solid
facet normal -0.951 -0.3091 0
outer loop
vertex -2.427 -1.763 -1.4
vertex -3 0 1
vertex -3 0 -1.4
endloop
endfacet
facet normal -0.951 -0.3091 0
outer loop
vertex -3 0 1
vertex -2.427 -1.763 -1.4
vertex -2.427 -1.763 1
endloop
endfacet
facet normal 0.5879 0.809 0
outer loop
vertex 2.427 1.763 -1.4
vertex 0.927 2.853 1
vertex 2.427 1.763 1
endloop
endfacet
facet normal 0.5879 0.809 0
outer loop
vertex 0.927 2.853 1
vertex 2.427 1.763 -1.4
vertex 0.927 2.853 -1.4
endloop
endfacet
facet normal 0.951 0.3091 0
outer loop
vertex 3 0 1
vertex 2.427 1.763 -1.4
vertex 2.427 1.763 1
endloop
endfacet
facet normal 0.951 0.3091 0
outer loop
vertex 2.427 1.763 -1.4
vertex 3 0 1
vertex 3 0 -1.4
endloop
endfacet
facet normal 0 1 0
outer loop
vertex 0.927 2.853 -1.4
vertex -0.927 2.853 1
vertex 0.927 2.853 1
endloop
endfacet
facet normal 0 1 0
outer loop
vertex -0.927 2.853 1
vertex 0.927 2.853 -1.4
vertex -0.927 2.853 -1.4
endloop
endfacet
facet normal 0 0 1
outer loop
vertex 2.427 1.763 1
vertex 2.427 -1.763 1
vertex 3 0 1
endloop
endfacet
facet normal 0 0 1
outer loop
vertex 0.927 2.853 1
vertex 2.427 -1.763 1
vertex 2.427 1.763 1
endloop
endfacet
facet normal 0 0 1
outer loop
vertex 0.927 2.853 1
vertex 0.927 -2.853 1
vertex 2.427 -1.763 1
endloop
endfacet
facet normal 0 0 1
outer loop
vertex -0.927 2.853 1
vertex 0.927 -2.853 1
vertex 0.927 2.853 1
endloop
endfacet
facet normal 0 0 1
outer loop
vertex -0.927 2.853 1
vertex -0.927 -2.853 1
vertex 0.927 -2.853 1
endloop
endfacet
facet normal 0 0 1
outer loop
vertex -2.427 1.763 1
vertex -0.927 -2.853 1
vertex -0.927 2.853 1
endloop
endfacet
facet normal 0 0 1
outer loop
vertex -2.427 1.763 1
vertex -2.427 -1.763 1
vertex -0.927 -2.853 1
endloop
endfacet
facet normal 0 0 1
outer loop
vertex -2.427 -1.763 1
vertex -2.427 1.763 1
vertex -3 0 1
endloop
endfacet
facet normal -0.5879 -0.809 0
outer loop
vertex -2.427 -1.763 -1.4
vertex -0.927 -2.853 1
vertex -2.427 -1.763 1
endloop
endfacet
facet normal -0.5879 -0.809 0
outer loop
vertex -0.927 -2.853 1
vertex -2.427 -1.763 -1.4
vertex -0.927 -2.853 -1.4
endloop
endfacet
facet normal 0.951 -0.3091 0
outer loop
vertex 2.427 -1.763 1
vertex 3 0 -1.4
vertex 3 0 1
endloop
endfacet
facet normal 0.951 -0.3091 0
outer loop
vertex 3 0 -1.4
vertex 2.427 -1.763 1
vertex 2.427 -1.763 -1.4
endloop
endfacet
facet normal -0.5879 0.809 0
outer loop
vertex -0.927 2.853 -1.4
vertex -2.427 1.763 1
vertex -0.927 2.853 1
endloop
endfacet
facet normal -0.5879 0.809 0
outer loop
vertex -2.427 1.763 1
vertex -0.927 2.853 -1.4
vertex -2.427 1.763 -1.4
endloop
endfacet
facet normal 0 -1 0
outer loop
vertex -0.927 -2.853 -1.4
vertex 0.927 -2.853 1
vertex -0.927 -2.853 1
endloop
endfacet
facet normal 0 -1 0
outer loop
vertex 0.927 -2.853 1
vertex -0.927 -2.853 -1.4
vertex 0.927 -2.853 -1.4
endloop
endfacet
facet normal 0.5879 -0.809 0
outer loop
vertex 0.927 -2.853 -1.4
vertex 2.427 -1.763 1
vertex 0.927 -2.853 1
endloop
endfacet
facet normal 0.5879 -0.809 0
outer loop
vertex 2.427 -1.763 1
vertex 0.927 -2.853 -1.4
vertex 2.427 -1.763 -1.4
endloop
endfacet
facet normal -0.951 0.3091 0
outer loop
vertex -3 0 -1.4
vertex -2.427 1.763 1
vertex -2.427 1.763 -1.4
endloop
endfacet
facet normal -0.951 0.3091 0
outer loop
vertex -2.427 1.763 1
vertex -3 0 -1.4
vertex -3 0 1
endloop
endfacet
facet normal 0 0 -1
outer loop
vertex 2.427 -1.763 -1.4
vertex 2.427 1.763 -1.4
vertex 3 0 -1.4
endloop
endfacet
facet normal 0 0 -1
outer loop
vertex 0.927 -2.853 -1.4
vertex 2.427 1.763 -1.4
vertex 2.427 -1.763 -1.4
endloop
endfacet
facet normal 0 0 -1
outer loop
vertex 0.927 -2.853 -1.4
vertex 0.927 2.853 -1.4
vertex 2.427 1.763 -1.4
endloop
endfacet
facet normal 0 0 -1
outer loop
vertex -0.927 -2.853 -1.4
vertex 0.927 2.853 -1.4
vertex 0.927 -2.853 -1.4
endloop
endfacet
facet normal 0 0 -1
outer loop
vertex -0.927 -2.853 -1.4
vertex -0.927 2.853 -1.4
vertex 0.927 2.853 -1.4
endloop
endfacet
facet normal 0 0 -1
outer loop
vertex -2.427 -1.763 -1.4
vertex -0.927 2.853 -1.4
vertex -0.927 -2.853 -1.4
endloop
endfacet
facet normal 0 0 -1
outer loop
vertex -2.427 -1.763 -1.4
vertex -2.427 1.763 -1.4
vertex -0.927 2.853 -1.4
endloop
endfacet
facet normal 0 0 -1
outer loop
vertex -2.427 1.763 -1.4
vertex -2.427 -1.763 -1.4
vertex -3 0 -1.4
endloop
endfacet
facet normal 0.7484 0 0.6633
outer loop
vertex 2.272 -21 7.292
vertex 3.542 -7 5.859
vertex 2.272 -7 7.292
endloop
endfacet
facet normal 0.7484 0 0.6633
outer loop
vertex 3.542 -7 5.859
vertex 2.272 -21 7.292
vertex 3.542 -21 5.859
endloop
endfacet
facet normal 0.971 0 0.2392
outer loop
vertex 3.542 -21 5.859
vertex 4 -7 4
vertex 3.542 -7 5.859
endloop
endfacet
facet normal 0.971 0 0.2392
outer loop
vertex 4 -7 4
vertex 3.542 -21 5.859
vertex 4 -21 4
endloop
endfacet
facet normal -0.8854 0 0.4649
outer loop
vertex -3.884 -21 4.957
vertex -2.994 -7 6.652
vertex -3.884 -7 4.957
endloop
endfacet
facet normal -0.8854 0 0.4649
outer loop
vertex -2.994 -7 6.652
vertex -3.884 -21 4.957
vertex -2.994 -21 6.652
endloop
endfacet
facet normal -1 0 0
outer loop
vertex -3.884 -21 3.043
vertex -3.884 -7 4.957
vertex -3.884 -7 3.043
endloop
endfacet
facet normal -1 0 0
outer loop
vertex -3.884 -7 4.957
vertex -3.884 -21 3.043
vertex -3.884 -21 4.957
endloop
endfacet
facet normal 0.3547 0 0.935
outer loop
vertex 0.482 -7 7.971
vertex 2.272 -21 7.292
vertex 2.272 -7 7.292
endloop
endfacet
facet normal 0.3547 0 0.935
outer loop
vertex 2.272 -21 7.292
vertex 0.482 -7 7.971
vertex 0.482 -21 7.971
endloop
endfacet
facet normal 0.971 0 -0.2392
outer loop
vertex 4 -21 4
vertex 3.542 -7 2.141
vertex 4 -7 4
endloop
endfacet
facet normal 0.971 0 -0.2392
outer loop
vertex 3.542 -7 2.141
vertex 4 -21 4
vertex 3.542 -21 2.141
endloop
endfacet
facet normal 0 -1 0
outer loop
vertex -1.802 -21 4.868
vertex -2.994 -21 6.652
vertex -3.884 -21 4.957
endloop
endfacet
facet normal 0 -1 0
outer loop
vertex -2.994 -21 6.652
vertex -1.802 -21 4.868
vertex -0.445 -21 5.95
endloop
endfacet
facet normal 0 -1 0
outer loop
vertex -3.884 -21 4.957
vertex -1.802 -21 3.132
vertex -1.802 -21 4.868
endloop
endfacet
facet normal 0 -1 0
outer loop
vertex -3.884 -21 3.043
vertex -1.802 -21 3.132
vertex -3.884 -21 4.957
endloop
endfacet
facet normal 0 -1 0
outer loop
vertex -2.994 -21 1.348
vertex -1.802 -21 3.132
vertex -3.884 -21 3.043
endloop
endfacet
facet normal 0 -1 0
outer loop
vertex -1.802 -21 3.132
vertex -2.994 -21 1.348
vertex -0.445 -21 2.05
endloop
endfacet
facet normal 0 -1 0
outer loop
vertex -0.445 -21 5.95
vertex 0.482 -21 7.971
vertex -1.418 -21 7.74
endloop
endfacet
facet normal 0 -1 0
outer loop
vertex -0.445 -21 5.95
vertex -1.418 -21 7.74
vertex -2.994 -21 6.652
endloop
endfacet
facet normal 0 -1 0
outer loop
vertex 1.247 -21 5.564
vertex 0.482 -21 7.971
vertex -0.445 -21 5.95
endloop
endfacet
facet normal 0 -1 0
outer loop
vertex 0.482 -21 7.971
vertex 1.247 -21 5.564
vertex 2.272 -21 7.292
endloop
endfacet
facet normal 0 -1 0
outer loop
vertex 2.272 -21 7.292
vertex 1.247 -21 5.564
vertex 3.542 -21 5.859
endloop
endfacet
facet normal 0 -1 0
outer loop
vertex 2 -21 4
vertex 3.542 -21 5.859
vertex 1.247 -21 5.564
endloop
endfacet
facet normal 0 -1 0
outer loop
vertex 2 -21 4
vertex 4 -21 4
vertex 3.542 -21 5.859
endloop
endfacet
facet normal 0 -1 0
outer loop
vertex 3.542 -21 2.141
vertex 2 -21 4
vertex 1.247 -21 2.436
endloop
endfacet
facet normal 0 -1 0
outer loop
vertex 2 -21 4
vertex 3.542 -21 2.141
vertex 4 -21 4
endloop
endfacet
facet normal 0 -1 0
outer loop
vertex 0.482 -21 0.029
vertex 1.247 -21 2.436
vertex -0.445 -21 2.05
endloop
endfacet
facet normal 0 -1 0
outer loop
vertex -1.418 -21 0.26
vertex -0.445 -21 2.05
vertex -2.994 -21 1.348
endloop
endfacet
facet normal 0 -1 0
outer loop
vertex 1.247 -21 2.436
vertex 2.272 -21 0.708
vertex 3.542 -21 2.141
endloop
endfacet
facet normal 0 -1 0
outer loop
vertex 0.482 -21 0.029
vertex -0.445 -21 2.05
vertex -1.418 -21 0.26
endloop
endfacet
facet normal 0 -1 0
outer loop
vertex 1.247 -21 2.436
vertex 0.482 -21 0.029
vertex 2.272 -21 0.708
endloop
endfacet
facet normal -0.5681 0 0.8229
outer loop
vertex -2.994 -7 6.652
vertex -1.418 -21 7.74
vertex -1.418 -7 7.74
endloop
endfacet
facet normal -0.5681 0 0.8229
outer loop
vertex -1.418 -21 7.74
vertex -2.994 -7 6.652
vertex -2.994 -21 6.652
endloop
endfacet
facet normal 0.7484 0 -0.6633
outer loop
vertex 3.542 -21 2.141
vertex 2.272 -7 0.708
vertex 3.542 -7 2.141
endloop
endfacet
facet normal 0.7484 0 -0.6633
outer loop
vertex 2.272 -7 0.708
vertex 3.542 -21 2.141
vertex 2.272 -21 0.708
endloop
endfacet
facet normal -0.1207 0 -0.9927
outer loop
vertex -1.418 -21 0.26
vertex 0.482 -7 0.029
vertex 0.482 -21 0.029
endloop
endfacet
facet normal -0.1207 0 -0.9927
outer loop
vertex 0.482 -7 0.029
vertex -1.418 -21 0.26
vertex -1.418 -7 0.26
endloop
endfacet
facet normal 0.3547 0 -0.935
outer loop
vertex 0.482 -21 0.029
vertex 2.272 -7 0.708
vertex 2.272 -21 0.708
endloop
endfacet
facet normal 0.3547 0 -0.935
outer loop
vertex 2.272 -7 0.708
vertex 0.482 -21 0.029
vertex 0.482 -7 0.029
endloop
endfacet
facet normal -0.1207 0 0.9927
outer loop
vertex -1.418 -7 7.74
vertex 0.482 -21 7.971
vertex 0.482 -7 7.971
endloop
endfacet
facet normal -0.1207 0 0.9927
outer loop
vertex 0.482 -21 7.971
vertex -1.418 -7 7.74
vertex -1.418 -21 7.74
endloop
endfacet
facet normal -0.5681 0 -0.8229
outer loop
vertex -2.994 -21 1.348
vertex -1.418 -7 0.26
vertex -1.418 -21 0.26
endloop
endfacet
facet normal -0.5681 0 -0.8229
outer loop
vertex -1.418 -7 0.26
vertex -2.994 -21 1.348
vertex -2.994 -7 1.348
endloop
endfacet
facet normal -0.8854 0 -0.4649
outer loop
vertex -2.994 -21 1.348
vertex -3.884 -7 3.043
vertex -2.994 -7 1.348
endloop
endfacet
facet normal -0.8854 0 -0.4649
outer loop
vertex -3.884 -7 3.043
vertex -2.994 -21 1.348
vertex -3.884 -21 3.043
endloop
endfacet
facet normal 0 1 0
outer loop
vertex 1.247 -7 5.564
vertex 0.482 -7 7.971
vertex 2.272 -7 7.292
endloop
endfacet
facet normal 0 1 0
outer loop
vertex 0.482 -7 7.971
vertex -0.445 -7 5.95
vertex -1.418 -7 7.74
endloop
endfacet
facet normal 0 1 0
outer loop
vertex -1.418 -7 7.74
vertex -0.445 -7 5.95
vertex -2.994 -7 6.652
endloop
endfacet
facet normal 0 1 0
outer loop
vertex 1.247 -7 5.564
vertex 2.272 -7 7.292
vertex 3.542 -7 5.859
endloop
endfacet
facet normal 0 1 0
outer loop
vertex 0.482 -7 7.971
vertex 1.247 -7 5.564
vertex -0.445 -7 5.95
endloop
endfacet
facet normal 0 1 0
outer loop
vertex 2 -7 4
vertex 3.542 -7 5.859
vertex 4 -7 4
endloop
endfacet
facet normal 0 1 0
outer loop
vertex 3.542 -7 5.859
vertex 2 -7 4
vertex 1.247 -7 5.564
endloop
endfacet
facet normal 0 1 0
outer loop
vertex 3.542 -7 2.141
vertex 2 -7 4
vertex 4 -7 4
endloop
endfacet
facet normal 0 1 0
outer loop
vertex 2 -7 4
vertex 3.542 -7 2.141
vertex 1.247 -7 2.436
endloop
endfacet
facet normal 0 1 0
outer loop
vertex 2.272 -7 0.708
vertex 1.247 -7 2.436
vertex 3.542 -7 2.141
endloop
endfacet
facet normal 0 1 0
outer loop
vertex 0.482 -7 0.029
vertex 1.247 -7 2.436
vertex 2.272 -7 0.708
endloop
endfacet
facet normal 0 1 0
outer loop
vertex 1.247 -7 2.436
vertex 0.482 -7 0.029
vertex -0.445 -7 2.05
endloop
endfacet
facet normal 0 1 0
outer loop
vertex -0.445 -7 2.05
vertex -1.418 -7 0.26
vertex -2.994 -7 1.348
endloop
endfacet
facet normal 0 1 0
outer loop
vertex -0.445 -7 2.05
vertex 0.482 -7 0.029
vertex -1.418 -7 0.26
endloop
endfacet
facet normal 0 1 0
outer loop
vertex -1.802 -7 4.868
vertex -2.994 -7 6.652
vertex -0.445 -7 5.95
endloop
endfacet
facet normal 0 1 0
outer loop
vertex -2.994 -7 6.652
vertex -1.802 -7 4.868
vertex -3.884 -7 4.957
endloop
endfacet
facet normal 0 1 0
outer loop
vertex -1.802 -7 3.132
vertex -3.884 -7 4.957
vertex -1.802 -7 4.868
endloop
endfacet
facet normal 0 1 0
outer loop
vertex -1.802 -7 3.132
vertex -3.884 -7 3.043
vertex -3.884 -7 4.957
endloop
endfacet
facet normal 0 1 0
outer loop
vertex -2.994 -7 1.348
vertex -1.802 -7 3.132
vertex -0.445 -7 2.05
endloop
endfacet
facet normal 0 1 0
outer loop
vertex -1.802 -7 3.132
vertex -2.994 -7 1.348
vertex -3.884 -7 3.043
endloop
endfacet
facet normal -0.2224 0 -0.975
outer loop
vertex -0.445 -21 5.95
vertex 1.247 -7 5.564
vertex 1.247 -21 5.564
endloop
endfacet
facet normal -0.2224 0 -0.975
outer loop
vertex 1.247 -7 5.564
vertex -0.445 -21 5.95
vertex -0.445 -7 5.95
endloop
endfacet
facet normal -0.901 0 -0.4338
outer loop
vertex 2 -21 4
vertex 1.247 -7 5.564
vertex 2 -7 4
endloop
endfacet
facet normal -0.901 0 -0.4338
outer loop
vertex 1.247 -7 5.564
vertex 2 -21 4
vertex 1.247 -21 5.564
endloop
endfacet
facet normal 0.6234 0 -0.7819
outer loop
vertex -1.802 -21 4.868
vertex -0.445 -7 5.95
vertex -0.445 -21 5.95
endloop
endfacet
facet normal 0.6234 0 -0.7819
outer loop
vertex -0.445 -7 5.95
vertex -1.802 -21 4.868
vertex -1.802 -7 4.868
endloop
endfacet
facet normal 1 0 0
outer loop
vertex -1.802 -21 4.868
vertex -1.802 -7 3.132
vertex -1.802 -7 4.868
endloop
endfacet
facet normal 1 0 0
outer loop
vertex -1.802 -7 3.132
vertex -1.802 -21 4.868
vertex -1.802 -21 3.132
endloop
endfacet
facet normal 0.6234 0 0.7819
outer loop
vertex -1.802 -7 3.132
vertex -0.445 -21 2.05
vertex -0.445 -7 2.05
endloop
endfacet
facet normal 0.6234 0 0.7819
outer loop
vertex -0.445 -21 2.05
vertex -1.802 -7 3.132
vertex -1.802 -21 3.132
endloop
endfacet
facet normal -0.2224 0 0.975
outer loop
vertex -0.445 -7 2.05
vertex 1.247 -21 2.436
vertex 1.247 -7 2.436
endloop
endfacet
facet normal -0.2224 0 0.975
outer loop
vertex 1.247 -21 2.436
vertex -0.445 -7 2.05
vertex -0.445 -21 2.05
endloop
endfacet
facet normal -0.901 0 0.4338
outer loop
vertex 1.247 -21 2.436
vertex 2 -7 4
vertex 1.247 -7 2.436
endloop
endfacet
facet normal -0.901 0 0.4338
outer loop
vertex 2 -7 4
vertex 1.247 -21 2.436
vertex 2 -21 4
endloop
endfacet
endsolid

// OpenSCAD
// Parameters
type_selector = 0; //[0:2:1]
ring_thickness = 2.0; //[1.0:4.0:0.1]
ring_outer_diameter = 16.0; //[8.0:32.0:0.5]
ring_inner_diameter = 6.0; //[3.0:12.0:0.5]
terminal_width = 8.0; //[4.0:16.0:0.5]
terminal_length = 28.0; //[14.0:56.0:1]
crimp_length = 14.0; //[7.0:28.0:1]
crimp_outer_diameter = 8.0; //[4.0:16.0:0.5]
crimp_inner_diameter = 4.0; //[2.0:12.0:0.5]
tab_bend_angle_deg = 45.0; //[0.0:75.0:1]
secondary_hole_diameter = 3.0; //[1.5:6.0:0.5]
overlap = 1.0; //[0.5:2.0:0.1]
eps = 0.2; //[0.05:0.5:0.05]

// Ring Terminal - complete geometry
module ring_terminal() {
  color("Silver") {
    // Ring Terminal Body
    linear_extrude(height=ring_thickness) {
      polygon(points=[
        [-terminal_width/2, -(terminal_length - ring_outer_diameter/2)],
        [terminal_width/2, -(terminal_length - ring_outer_diameter/2)],
        [terminal_width/2, -ring_inner_diameter/2],
        [ring_outer_diameter/2, -ring_inner_diameter/2],
        [ring_outer_diameter/2, ring_inner_diameter/2],
        [terminal_width/2, ring_inner_diameter/2],
        [terminal_width/2, 0],
        [ring_outer_diameter/2, 0],
        [ring_outer_diameter/2, ring_outer_diameter/2],
        [0, ring_outer_diameter/2],
        [-ring_outer_diameter/2, ring_outer_diameter/2],
        [-ring_outer_diameter/2, 0],
        [-ring_outer_diameter/2, -ring_outer_diameter/2],
        [0, -ring_outer_diameter/2],
        [ring_outer_diameter/2, -ring_outer_diameter/2],
        [ring_outer_diameter/2, -ring_inner_diameter/2],
        [-terminal_width/2, -ring_inner_diameter/2],
        [-terminal_width/2, -(terminal_length - ring_outer_diameter/2)]
      ]);
    }
    // Ring Hole
    translate([0, 0, -eps])
      cylinder(r=ring_inner_diameter/2, h=ring_thickness + 2*eps, center=true);
  }
}

// Wire Termination Section - Crimp Barrel
module wire_termination_section_crimp() {
  color("DimGray") {
    difference() {
      // Outer Crimp Barrel
      translate([0, -(ring_outer_diameter/2 + crimp_length/2 - overlap), ring_thickness/2 + crimp_outer_diameter/2 - overlap])
        rotate([90, 0, 0])
        cylinder(r=crimp_outer_diameter/2, h=crimp_length, center=true);
      // Inner Crimp Barrel
      translate([0, -(ring_outer_diameter/2 + crimp_length/2 - overlap), ring_thickness/2 + crimp_outer_diameter/2 - overlap])
        rotate([90, 0, 0])
        cylinder(r=crimp_inner_diameter/2, h=crimp_length + 2*eps, center=true);
    }
  }
}

// Wire Termination Section - Tab
module wire_termination_section_tab() {
  color("DimGray") {
    difference() {
      // Flat Tab Section
      translate([0, -((terminal_length - ring_outer_diameter/2)/2 + ring_outer_diameter/2 - overlap), 0])
        rotate([tab_bend_angle_deg * (type_selector==0 ? 0 : 1), 0, 0])
        cube([terminal_width, (terminal_length - ring_outer_diameter/2), ring_thickness], center=true);
      // Secondary Hole (if applicable)
      if (type_selector == 2) {
        translate([0, -(terminal_length - terminal_width/2), 0])
          cylinder(r=secondary_hole_diameter/2, h=ring_thickness + 2*eps, center=true);
      }
    }
  }
}

// Ring Terminal Assembly
module ring_terminal_assembly() {
  union() {
    ring_terminal();
    if (type_selector == 0) {
      wire_termination_section_crimp();
    } else {
      wire_termination_section_tab();
    }
  }
}

// Final Assembly
module assembly() {
  ring_terminal_assembly();
}

assembly();
